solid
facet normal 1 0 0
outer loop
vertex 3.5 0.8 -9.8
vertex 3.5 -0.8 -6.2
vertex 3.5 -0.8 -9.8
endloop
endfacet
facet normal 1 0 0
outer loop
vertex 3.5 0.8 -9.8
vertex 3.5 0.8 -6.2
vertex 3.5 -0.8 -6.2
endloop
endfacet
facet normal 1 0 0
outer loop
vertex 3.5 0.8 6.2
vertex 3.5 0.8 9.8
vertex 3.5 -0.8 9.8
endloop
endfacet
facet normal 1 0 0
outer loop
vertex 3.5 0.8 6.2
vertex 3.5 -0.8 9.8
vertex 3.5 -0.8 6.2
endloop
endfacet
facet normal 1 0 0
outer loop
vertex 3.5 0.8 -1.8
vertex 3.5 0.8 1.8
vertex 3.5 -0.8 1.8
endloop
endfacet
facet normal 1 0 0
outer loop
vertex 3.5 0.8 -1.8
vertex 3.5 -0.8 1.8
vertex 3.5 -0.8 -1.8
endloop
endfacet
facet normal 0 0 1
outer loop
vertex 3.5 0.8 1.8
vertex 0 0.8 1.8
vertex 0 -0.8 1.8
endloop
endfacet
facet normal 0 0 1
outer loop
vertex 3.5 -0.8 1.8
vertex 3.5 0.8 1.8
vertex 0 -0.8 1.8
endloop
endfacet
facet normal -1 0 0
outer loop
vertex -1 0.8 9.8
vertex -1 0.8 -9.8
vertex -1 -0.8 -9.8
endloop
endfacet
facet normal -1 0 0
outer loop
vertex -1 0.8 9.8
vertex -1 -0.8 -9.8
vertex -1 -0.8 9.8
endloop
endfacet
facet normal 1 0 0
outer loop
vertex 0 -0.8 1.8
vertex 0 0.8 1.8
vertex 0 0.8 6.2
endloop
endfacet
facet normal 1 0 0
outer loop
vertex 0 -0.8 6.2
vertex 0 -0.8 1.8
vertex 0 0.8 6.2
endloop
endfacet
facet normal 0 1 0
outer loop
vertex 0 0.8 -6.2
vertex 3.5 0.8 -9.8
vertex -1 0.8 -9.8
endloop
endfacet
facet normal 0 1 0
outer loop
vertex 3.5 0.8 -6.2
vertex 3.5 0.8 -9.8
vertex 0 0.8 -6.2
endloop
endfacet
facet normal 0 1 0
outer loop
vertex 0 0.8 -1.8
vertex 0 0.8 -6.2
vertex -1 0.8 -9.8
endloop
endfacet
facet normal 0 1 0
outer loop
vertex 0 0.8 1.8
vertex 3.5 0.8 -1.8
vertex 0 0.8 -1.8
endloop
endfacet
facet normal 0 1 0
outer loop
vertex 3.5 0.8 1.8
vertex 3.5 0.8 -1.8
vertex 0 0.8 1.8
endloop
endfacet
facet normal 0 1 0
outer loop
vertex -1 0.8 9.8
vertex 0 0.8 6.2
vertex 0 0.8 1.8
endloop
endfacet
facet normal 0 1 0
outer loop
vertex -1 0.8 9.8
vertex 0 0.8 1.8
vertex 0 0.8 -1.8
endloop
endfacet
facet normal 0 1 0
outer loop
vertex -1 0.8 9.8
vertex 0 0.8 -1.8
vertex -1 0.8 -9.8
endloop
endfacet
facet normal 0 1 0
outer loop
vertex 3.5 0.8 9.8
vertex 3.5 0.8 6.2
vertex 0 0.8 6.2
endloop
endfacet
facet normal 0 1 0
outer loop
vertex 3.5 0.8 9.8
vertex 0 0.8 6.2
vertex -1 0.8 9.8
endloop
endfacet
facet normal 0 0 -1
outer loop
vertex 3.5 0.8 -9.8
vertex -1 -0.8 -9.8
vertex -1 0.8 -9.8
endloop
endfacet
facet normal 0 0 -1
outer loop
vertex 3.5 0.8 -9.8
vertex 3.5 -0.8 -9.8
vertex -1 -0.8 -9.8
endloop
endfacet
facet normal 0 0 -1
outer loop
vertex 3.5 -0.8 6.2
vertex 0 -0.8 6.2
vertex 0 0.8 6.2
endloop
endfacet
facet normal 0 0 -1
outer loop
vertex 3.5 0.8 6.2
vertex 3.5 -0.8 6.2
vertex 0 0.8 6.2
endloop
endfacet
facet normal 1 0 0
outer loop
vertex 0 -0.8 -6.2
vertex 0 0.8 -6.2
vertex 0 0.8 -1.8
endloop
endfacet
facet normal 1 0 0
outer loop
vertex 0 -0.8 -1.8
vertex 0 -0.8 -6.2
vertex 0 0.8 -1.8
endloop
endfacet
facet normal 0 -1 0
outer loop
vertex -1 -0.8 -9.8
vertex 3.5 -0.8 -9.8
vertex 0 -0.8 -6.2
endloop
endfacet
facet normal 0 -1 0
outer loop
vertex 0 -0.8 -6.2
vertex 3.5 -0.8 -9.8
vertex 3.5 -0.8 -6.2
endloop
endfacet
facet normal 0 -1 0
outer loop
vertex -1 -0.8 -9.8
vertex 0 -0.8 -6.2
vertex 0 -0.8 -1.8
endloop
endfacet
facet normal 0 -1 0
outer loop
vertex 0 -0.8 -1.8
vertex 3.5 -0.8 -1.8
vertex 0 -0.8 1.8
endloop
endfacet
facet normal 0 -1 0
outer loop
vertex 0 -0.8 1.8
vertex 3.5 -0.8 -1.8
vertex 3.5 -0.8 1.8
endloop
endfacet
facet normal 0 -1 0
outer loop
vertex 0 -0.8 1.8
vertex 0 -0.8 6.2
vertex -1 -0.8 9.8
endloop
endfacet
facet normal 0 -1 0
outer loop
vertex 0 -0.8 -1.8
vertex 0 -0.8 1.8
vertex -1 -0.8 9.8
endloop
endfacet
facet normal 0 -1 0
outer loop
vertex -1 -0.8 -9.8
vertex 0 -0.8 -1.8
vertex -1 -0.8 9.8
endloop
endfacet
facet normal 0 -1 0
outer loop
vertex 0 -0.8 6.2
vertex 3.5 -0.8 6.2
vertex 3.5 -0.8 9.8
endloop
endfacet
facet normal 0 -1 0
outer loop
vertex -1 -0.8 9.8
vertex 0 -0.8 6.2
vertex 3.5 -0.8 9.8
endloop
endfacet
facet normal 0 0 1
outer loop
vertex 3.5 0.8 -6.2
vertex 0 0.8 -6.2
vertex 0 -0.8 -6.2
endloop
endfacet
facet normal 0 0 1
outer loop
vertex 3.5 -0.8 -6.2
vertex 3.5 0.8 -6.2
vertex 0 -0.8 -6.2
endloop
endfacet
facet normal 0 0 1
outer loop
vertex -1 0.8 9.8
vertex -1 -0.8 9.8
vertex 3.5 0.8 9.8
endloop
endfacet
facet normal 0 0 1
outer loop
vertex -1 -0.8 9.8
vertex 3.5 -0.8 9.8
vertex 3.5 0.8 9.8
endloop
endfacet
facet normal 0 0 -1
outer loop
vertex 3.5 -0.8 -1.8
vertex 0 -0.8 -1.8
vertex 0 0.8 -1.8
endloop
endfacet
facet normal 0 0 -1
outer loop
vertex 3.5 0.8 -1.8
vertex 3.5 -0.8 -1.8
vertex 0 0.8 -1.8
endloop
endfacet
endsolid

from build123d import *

# Parameters (mm, degrees)
SKETCH_1_W      = 1.8
SKETCH_1_H      = 0.8
EXTRUDE_1_DEPTH = 3.5
SKETCH_2_W      = 19.6
SKETCH_2_H      = 1.6
EXTRUDE_2_DEPTH = 1


with BuildPart() as part:
    # 草图1 → 凸台-拉伸1 (new body)
    with BuildSketch(Plane(origin=(0, 0, 0), x_dir=(0, 0, -1), z_dir=(1, 0, 0))):
        Polygon((-8, -0.8), (-8, 0), (-8, 0.8), (-9.8, 0.8), (-9.8, -0.8), align=None)
        with Locations((-7.1, -0.4)):
            Rectangle(SKETCH_1_W, SKETCH_1_H)
        with Locations((-7.1, 0.4)):
            Rectangle(SKETCH_1_W, SKETCH_1_H)
        with Locations((-0.9, 0.4)):
            Rectangle(SKETCH_1_W, SKETCH_1_H)
        with Locations((-0.9, -0.4)):
            Rectangle(SKETCH_1_W, SKETCH_1_H)
        with Locations((0.9, -0.4)):
            Rectangle(SKETCH_1_W, SKETCH_1_H)
        with Locations((0.9, 0.4)):
            Rectangle(SKETCH_1_W, SKETCH_1_H)
        with Locations((7.1, -0.4)):
            Rectangle(SKETCH_1_W, SKETCH_1_H)
        with Locations((7.1, 0.4)):
            Rectangle(SKETCH_1_W, SKETCH_1_H)
        Polygon((8, 0.8), (8, 0), (8, -0.8), (9.8, -0.8), (9.8, 0.8), align=None)
    extrude(amount=EXTRUDE_1_DEPTH)

    # 草图2 → 凸台-拉伸2 (add)
    with BuildSketch(Plane.ZY):
        Rectangle(SKETCH_2_W, SKETCH_2_H)
    extrude(amount=EXTRUDE_2_DEPTH)


solid = part.part
